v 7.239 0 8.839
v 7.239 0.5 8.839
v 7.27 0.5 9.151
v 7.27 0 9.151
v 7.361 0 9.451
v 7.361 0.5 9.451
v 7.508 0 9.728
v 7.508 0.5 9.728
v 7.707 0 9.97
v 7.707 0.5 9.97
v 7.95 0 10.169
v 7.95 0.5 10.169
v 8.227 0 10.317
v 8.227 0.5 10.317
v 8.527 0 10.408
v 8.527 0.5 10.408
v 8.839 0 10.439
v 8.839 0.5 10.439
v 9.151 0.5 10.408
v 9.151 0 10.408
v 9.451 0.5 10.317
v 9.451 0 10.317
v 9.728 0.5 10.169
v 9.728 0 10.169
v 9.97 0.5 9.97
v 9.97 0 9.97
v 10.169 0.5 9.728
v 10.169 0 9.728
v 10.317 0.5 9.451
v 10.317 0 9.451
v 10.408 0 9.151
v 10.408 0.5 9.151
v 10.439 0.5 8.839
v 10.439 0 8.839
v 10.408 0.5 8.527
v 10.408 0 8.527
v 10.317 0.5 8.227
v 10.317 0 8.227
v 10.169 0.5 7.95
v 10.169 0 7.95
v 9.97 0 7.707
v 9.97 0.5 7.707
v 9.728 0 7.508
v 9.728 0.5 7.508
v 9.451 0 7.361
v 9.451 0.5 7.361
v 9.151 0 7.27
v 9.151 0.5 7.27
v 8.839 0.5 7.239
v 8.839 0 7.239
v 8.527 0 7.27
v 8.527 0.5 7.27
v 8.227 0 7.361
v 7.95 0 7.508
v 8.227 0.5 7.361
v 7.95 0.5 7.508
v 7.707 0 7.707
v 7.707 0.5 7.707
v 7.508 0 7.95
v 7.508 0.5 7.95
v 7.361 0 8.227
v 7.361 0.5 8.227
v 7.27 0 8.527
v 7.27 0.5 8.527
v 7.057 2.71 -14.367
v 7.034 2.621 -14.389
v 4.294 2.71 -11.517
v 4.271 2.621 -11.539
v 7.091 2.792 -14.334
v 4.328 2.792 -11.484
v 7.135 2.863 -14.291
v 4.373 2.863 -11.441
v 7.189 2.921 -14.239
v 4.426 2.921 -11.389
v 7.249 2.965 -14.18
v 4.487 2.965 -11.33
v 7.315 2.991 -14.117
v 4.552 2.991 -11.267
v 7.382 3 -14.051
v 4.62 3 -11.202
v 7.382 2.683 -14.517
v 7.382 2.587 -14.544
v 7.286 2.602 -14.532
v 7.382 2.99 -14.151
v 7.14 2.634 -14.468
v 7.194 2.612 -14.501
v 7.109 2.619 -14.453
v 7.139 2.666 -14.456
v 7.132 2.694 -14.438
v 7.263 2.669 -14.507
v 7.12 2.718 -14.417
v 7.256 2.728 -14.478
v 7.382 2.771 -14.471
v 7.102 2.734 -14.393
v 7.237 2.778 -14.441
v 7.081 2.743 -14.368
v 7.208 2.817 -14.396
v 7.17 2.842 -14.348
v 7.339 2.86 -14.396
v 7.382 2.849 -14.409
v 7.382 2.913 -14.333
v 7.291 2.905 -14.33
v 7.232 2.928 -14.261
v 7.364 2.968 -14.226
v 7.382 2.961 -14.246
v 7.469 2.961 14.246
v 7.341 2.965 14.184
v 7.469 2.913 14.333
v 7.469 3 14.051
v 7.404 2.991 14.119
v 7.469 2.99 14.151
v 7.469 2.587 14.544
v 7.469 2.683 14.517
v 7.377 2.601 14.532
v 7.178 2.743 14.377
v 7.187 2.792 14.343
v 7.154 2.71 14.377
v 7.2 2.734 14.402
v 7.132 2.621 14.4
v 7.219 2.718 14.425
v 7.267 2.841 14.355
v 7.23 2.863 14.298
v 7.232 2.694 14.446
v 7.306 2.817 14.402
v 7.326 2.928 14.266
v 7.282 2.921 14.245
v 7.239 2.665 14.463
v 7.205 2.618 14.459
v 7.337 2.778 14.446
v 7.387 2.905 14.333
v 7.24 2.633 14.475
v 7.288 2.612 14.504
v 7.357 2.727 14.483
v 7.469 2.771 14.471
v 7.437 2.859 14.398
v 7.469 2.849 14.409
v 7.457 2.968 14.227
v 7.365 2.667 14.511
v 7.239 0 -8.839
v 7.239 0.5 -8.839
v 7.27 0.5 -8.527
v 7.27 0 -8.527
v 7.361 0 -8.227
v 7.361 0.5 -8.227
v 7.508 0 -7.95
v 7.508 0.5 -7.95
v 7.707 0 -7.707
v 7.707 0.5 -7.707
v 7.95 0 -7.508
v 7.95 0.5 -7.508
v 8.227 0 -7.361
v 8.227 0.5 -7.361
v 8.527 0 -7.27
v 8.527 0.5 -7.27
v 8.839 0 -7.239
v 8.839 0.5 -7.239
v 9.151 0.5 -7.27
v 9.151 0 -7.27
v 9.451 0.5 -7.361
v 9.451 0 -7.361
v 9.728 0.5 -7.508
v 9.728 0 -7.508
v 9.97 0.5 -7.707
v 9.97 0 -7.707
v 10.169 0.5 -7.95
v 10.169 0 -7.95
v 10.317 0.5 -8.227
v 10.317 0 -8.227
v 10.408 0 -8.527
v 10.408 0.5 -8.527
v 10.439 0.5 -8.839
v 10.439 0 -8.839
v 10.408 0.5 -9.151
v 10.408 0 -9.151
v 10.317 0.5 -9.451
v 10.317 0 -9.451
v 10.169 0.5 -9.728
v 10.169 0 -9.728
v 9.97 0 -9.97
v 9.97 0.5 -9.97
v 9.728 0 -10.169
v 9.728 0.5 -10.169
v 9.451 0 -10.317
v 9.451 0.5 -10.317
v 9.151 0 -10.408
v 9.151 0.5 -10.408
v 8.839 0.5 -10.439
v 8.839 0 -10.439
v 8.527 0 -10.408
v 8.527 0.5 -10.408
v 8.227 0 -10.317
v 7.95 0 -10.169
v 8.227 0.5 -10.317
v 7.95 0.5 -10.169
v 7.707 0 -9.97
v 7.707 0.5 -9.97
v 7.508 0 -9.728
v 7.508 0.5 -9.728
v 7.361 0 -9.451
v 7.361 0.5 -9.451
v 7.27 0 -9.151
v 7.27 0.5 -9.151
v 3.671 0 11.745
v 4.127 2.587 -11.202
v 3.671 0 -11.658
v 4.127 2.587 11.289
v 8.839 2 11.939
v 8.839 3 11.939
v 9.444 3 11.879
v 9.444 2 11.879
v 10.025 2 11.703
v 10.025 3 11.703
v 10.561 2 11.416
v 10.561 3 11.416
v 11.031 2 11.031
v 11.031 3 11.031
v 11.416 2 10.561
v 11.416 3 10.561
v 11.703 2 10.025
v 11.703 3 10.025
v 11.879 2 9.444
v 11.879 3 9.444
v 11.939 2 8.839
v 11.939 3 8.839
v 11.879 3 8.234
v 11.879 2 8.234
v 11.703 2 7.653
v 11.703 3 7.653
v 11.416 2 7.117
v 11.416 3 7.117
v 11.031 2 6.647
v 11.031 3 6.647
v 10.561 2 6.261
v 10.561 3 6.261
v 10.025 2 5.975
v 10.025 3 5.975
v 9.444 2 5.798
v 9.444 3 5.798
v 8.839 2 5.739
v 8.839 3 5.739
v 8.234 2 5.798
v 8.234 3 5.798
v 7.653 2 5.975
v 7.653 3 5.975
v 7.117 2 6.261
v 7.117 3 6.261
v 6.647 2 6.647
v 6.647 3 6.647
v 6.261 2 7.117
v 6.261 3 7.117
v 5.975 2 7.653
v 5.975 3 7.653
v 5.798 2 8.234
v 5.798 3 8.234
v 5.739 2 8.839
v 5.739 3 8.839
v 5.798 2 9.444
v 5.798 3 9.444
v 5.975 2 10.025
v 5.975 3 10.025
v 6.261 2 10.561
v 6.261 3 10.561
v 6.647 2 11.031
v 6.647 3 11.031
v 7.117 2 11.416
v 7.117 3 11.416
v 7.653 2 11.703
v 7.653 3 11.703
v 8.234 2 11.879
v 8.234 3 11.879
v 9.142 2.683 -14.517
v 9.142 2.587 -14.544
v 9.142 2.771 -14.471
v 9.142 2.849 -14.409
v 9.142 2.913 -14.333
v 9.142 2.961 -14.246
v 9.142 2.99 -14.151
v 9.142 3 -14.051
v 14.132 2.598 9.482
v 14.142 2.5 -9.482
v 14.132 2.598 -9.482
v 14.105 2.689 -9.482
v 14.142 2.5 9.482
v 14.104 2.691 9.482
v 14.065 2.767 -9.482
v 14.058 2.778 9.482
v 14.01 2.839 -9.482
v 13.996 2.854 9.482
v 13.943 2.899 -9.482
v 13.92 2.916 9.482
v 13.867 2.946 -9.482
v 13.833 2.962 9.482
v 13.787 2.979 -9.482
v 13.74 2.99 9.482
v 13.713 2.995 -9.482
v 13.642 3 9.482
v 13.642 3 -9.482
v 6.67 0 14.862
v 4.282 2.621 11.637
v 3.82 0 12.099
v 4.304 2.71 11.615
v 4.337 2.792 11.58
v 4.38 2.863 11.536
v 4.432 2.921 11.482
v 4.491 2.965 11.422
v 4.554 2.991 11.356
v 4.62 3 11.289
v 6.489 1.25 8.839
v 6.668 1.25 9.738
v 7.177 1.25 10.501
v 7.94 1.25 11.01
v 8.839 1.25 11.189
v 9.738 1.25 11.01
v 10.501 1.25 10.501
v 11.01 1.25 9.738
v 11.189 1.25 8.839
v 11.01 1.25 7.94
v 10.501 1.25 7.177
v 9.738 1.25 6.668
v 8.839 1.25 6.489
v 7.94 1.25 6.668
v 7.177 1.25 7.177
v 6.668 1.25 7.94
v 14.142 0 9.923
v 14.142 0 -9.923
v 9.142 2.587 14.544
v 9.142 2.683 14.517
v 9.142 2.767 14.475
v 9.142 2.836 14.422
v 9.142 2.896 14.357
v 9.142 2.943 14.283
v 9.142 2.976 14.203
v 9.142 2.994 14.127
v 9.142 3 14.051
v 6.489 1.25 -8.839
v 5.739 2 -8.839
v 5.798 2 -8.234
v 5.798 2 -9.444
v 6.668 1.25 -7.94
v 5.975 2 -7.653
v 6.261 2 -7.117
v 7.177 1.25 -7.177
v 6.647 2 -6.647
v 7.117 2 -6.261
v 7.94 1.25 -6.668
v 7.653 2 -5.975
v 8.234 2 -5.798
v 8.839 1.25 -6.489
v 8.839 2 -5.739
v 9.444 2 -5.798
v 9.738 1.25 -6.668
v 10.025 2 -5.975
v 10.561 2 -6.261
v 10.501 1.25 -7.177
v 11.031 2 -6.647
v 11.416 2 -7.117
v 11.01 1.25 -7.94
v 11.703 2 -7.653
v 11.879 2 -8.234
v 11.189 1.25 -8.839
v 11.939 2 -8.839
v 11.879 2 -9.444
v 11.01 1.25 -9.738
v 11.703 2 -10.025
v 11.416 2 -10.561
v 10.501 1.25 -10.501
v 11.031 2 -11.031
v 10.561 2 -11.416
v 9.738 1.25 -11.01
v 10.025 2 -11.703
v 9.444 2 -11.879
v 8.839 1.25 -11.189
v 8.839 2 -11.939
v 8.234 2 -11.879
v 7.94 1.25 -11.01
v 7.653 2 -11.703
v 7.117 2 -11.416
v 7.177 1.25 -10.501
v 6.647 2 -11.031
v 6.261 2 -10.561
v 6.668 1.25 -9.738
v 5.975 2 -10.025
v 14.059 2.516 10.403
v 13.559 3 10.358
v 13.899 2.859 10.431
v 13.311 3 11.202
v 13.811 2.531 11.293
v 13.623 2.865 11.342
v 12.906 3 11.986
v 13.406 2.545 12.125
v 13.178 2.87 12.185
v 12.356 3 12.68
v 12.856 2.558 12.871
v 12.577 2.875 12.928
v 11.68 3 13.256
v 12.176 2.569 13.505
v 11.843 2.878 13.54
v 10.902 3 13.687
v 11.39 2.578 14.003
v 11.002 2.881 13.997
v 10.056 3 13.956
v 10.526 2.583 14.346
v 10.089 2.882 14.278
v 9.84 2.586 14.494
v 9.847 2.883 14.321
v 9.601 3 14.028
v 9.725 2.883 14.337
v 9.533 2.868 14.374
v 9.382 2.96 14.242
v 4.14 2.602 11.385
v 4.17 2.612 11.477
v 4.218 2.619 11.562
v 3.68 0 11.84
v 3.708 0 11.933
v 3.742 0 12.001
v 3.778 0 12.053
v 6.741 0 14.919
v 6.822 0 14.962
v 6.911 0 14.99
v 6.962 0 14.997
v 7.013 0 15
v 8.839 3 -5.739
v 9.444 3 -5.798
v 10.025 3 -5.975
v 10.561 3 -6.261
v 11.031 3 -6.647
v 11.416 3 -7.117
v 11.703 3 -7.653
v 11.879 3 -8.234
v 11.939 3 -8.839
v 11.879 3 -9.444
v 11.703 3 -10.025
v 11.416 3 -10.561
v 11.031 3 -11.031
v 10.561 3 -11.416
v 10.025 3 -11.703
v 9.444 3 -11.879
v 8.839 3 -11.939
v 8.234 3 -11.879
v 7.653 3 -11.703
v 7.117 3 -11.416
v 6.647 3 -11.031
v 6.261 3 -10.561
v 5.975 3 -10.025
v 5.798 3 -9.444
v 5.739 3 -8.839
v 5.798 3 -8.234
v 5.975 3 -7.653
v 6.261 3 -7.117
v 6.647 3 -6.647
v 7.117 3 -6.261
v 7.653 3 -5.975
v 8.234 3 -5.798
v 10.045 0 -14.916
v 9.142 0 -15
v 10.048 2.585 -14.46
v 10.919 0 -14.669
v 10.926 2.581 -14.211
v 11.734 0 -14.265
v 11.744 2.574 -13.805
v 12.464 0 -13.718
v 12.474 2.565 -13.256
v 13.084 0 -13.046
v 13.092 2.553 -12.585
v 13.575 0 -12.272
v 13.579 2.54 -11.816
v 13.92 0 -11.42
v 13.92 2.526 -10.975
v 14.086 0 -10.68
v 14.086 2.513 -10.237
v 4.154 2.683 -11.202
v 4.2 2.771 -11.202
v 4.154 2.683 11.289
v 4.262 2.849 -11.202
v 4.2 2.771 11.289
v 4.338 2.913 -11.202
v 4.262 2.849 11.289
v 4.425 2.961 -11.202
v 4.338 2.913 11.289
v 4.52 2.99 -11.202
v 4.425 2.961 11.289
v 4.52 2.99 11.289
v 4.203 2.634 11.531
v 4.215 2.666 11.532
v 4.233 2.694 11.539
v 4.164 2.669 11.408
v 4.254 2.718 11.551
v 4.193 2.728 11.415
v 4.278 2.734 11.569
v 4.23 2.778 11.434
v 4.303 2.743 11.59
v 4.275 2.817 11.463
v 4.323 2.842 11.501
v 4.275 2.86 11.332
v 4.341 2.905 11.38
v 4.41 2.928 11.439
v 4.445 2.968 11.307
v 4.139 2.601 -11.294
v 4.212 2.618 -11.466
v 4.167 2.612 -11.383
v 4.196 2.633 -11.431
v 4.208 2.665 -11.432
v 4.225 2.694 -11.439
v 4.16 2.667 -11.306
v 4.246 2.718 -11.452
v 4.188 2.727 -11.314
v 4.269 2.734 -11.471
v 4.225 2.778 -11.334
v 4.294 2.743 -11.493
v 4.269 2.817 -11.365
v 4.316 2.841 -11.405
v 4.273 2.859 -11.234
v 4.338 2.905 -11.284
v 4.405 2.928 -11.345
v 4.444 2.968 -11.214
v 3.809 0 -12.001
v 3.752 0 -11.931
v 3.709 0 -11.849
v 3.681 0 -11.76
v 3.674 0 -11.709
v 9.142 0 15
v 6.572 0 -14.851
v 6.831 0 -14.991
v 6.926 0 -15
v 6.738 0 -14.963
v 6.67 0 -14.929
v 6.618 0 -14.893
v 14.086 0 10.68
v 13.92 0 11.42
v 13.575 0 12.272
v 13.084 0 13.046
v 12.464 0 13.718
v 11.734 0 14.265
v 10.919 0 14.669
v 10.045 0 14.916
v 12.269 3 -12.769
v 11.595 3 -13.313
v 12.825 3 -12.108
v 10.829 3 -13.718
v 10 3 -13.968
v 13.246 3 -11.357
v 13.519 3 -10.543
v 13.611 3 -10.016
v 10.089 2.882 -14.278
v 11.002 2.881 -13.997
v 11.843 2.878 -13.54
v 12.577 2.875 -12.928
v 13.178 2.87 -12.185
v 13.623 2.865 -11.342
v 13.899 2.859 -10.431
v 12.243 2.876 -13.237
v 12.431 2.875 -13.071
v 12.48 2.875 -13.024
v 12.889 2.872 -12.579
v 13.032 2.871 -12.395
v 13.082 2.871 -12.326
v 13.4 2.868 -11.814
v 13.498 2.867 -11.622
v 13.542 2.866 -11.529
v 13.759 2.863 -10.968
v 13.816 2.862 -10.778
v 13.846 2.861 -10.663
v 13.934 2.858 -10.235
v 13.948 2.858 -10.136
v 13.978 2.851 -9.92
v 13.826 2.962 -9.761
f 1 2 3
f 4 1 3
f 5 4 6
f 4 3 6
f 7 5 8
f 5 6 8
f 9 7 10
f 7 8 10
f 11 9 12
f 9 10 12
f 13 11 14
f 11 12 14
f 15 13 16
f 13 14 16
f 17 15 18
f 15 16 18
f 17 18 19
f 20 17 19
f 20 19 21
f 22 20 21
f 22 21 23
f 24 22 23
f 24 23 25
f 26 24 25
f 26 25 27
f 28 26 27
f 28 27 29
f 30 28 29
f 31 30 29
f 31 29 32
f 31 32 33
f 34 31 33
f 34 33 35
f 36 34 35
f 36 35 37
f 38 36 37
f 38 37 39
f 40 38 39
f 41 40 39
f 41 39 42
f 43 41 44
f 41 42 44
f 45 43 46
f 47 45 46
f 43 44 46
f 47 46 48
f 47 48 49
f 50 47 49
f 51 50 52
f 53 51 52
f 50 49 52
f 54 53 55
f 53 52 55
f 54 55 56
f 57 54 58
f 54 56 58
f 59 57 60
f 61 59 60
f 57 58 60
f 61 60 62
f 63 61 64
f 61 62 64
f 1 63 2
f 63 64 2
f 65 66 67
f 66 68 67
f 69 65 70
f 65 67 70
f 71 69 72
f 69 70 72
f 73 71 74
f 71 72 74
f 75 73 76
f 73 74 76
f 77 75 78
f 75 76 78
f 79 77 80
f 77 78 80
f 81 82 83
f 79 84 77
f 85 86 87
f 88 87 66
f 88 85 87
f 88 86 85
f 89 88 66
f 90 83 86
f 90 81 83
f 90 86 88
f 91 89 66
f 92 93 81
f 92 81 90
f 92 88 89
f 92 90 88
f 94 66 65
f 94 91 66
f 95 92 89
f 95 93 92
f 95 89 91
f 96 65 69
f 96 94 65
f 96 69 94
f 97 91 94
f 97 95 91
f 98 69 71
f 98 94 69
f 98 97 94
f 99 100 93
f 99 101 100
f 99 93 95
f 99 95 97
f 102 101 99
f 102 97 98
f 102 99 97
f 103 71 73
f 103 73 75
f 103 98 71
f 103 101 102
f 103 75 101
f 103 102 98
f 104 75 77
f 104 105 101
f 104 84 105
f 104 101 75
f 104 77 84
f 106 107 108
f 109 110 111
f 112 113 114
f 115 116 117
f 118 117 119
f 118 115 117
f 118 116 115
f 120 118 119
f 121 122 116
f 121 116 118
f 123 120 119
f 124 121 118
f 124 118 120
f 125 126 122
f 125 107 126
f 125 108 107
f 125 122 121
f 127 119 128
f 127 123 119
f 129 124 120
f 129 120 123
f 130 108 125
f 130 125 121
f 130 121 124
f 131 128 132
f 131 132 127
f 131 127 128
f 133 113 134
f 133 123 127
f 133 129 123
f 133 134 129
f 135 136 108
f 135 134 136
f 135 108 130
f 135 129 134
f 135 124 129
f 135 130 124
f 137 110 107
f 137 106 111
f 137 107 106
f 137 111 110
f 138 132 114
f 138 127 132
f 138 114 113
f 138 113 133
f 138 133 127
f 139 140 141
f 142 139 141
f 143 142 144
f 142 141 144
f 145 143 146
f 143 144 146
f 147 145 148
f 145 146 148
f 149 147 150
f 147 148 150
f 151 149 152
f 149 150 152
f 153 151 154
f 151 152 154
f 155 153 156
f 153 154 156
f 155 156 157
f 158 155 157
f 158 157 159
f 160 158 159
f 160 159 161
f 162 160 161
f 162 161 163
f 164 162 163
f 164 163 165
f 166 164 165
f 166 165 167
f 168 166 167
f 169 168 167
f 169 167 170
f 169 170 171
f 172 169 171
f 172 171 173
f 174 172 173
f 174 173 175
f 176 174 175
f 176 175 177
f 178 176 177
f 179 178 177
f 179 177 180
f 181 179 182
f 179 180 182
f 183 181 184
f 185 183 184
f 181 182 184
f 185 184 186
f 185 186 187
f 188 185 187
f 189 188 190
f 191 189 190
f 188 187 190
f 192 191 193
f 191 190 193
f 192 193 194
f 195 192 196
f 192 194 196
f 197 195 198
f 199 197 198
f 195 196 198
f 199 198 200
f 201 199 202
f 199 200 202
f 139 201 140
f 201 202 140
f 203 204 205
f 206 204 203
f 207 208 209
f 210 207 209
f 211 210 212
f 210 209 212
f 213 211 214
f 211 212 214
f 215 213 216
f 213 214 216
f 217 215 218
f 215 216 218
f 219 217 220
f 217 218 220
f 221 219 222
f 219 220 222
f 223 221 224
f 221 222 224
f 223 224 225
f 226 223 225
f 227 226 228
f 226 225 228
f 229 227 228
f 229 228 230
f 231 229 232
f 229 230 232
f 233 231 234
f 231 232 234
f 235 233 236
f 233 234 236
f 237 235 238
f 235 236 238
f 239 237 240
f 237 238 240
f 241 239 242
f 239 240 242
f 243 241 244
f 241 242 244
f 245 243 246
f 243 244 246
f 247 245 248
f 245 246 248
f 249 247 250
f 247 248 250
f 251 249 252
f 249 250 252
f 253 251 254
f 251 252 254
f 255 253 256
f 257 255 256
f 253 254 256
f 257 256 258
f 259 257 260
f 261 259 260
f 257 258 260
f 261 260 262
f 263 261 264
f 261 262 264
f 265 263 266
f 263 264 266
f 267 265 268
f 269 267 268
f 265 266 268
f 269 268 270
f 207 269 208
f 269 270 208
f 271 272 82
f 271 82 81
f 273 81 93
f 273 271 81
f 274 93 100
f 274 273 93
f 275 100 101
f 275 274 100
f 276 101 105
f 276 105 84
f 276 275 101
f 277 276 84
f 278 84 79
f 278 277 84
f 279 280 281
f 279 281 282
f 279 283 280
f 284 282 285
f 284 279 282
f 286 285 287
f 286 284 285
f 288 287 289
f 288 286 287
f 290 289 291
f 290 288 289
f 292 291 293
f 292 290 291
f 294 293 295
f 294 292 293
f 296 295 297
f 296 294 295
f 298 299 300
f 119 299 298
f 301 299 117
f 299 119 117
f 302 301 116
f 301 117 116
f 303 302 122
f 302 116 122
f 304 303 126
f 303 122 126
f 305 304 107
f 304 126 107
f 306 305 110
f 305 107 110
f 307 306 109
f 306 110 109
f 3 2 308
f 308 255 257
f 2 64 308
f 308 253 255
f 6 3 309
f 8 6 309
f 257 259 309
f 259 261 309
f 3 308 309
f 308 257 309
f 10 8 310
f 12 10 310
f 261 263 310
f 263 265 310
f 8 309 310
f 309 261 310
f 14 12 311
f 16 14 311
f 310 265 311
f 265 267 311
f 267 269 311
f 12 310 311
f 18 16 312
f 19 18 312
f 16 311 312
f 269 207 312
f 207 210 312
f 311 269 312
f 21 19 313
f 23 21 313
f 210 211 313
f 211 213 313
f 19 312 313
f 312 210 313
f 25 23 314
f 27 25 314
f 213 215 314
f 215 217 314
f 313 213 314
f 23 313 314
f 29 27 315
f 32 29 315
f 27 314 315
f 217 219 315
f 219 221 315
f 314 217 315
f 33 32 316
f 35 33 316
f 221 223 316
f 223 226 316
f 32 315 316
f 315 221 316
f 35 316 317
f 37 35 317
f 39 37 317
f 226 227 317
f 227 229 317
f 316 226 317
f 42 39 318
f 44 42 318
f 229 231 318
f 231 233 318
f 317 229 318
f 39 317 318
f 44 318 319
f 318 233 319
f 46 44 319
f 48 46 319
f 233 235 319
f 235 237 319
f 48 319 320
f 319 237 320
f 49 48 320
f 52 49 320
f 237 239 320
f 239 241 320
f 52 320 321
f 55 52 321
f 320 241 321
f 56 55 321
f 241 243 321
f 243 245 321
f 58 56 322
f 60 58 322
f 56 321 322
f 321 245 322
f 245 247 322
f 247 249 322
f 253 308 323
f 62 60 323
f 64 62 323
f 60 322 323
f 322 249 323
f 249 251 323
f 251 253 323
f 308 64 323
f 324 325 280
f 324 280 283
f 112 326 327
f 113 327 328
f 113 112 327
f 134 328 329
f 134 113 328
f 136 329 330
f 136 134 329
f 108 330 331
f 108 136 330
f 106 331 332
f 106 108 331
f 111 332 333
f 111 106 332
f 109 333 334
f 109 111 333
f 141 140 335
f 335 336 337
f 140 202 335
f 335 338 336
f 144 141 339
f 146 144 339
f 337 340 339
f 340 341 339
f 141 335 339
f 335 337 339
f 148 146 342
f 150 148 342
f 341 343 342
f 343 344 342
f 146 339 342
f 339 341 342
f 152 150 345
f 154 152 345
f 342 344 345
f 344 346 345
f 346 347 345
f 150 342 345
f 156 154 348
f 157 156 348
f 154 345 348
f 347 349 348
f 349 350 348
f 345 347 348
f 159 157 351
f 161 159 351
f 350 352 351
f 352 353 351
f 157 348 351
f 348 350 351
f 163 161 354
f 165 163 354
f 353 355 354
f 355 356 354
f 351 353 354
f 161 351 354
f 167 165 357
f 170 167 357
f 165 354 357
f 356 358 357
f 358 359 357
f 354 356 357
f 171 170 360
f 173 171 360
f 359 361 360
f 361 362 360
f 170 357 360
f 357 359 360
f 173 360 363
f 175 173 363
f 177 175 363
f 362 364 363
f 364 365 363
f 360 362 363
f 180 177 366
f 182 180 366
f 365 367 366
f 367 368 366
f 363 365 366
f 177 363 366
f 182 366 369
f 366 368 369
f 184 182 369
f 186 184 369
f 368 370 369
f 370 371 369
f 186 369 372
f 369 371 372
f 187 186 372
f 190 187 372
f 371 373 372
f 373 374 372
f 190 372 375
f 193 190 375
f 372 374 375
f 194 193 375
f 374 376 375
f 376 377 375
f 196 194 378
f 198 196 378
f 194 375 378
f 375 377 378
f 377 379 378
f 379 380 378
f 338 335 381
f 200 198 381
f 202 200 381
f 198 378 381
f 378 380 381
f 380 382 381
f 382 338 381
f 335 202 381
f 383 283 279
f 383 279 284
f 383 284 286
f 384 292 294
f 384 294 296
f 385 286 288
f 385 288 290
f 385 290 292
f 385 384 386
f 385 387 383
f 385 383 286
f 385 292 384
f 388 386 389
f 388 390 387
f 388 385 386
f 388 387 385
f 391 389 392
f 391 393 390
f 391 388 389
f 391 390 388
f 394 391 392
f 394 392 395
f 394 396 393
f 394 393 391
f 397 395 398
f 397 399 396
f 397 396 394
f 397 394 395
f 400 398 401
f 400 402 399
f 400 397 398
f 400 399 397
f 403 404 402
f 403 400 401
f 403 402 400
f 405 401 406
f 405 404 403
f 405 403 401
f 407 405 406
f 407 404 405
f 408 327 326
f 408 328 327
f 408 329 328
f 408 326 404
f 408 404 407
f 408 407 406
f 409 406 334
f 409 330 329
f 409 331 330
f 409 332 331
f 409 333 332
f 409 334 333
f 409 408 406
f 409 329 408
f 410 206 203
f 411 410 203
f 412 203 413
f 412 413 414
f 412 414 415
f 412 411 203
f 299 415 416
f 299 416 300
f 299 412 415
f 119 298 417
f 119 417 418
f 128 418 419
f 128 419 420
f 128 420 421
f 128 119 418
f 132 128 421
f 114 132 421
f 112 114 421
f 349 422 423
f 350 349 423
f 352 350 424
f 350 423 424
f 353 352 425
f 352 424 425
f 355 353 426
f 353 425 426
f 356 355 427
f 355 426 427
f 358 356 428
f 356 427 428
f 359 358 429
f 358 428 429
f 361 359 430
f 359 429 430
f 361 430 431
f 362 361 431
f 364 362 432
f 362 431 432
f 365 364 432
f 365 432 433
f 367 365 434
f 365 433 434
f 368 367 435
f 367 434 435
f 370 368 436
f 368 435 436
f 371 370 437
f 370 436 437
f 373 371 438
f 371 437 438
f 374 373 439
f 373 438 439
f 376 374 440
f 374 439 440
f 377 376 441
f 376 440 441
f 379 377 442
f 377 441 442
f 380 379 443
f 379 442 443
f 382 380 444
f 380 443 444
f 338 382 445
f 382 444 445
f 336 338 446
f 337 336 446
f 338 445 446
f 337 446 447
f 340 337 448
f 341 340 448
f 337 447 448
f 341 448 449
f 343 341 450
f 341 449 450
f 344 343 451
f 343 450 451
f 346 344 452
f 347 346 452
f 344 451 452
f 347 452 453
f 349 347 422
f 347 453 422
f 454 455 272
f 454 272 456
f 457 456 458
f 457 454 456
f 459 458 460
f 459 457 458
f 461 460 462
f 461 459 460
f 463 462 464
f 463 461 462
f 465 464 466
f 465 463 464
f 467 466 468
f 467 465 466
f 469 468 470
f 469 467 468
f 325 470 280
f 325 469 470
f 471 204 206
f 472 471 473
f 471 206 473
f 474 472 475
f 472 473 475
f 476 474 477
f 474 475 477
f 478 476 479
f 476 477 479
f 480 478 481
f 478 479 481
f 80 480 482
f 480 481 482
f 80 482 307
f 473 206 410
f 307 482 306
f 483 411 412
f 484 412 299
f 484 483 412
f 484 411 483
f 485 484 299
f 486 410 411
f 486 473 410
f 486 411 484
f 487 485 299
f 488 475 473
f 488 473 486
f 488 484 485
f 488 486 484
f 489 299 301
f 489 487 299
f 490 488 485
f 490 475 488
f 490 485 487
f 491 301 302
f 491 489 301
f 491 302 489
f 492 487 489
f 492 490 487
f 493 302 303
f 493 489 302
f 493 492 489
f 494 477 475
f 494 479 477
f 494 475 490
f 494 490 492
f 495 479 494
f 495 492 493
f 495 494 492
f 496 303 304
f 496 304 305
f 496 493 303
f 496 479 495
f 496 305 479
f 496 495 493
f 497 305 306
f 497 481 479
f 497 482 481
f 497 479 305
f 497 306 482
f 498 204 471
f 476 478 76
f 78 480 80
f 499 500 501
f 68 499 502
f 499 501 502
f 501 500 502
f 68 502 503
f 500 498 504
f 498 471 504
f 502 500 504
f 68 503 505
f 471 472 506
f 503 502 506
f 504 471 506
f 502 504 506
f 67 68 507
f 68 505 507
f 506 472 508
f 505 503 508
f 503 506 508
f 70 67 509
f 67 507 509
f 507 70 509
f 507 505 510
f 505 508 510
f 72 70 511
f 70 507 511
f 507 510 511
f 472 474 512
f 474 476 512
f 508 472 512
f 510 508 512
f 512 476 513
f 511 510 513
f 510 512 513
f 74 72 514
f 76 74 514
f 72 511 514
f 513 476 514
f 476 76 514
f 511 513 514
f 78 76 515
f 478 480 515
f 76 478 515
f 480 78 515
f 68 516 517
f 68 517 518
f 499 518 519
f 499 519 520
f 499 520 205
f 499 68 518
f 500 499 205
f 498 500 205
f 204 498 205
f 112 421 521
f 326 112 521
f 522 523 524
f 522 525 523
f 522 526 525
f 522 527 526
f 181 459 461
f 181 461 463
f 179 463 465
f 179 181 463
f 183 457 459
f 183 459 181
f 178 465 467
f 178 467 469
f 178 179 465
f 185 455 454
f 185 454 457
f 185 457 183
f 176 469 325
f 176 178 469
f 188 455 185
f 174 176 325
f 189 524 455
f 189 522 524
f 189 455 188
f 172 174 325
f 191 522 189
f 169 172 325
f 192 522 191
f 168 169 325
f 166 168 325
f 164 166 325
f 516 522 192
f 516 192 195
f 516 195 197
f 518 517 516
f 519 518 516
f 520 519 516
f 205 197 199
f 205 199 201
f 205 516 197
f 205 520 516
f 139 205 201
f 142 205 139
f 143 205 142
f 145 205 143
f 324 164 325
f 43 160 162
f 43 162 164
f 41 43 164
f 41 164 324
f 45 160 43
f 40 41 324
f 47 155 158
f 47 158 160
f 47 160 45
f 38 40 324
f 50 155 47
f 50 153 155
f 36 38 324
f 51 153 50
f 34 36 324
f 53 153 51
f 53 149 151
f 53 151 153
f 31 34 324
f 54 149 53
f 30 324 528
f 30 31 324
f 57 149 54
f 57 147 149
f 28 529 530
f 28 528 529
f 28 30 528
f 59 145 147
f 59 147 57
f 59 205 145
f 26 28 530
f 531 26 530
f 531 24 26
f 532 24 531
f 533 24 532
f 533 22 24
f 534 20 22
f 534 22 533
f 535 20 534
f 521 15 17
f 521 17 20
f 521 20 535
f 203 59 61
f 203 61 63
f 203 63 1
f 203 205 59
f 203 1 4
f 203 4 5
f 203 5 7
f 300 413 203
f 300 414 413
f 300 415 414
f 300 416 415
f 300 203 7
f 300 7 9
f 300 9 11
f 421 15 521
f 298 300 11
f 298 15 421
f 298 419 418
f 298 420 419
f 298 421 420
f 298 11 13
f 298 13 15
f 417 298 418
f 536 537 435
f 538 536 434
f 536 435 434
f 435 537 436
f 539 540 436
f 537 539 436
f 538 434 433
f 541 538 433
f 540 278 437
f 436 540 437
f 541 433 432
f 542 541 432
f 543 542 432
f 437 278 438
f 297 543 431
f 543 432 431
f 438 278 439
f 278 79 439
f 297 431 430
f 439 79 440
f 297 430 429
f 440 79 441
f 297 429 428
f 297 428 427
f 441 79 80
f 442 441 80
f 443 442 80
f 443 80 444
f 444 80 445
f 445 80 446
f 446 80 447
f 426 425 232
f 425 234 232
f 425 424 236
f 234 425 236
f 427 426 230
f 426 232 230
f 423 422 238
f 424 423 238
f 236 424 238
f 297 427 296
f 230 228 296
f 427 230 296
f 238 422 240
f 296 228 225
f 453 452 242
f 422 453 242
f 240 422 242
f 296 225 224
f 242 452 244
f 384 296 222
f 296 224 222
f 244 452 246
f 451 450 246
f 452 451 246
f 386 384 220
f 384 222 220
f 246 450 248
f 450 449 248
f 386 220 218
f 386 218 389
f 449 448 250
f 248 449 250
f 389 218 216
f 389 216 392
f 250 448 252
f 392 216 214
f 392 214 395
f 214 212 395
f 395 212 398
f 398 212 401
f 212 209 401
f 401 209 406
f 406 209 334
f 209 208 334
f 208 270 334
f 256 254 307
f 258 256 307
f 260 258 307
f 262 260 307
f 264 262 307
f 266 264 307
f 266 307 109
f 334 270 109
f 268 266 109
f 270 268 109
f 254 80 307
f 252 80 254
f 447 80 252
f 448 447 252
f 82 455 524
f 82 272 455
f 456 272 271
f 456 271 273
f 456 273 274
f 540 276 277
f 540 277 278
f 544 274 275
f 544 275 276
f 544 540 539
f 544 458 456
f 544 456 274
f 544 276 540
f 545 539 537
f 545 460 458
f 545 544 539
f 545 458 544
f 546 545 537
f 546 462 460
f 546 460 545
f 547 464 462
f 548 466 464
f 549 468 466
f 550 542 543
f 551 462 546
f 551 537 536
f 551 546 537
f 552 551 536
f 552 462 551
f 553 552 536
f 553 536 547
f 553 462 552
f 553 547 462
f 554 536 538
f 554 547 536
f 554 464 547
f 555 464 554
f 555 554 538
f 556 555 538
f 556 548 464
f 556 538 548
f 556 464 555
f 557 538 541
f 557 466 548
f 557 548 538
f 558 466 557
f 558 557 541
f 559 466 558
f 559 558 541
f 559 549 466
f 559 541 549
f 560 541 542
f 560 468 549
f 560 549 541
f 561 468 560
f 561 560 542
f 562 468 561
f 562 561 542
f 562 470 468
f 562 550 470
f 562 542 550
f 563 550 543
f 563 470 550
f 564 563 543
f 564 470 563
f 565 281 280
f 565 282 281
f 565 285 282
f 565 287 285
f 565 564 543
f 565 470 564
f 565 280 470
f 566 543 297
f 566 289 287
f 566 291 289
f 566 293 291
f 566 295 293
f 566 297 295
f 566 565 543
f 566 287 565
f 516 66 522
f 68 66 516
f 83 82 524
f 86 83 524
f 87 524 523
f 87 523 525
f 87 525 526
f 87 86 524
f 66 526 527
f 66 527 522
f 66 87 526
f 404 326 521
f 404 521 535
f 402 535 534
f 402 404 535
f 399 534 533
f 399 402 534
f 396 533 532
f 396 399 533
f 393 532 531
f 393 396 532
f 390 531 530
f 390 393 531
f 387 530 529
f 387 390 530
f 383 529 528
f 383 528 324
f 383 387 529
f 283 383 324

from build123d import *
from OCP.BRepFilletAPI import BRepFilletAPI_MakeChamfer

# Parameters (mm, degrees)
EXTRUDE_1_DEPTH     = 3
EXTRUDE_1_TAPER     = 10.000000000000021
EXTRUDE_3_DEPTH     = 3
CUT_EXTRUDE_3_DEPTH = 17.82260394825962
SKETCH_6_R          = 1.6
CUT_EXTRUDE_2_DEPTH = 21.832600617678803
SKETCH_9_R          = 3.1000000000000005
CUT_EXTRUDE_4_DEPTH = 1
CHAMFER_1_SIZE      = 1.5
FILLET_2_R          = 5
CHAMFER_2_SIZE      = 3
CHAMFER_2_SIZE2     = 3.094724616911856
CHAMFER_2_SIZE2_2   = 3.0947246169118565
FILLET_1_R          = 0.5


with BuildPart() as part:
    # Эскиз1 → Бобышка-Вытянуть1 (new body)
    with BuildSketch(Plane(origin=(0, 0, 0), x_dir=(1, 0, 0), z_dir=(0, 1, 0))):
        Polygon((3.6710190578746005, 14.999999999999998), (3.6710190578746094, -15.000000000000004), (7.67101905787461, -15.000000000000002), (7.6710190578746005, 14.999999999999998), align=None)
    extrude(amount=EXTRUDE_1_DEPTH, taper=EXTRUDE_1_TAPER)


with BuildPart() as body_2:
    # Эскиз2 → Бобышка-Вытянуть3 (new body)
    with BuildSketch(Plane(origin=(0, 0, 0), x_dir=(1, 0, 0), z_dir=(0, 1, 0))):
        Polygon((7.142038115749204, 14.471019057874603), (7.142038115749204, 14.999999999999998), (14.142038115749205, 14.999999999999996), (14.142038115749209, -15.000000000000004), (7.142038115749207, -15.000000000000004), (7.142038115749214, -14.471019057874607), align=None)
    extrude(amount=EXTRUDE_3_DEPTH)

    # Эскиз8 → Вырез-Вытянуть3 (cut, through all)
    with BuildSketch(Plane.ZY.offset(-7.142038115749204)):
        Polygon((-14.999999999999998, 2.999999999999999), (-14.999999999999998, 0), (-14.471019057874603, 3), align=None)
        Polygon((14.471019057874607, 3), (15.000000000000004, 0), (15, 2.999999999999999), align=None)
    extrude(amount=-CUT_EXTRUDE_3_DEPTH, mode=Mode.SUBTRACT)


with BuildPart() as part_1:
    add(part.part)

    # Combine 1: union body 2
    add(body_2.part)

    # Эскиз6 → Вырез-Вытянуть2 (cut, through all)
    with BuildSketch(Plane(origin=(0, 3, 0), x_dir=(1, 1.64e-15, 0), z_dir=(-1.64e-15, 1, 0))):
        with Locations(Location((8.838834764831857, 8.83883476483183, 0), (0, 0, 180))):
            Circle(SKETCH_6_R)
        with Locations(Location((8.838834764831846, -8.83883476483184, 0), (0, 0, 180))):
            Circle(SKETCH_6_R)
    extrude(amount=-CUT_EXTRUDE_2_DEPTH, mode=Mode.SUBTRACT)

    # Эскиз9 → Вырез-Вытянуть4 (cut)
    with BuildSketch(Plane(origin=(0, 3, 0), x_dir=(1, 0, 0), z_dir=(0, 1, 0))):
        with Locations(Location((8.838834764831857, 8.83883476483183, 0), (0, 0, 270))):
            Circle(SKETCH_9_R)
        with Locations(Location((8.838834764831846, -8.83883476483184, 0), (0, 0, 270))):
            Circle(SKETCH_9_R)
    extrude(amount=-CUT_EXTRUDE_4_DEPTH, mode=Mode.SUBTRACT)

    # Фаска1
    chamfer_1_edges = [part_1.edges().sort_by_distance(p)[0] for p in [
        (10.438834764831858, 2.0000000000000027, -8.83883476483183),
        (10.438834764831848, 2.0000000000000027, 8.83883476483184),
    ]]
    chamfer(chamfer_1_edges, length=CHAMFER_1_SIZE - 0.0001)  # a hair under: the kernel refuses the full size

    # Скругление2
    fillet_2_edges = [part_1.edges().sort_by_distance(p)[0] for p in [
        (14.142038115749205, 1.5000000000000049, -14.7355095289373),
        (14.142038115749209, 1.5, 14.735509528937309),
    ]]
    fillet(fillet_2_edges, radius=FILLET_2_R)

    # Фаска2: one chamfer whose edges measure the first distance from different faces: ONE call of the kernel's chamfer builder (chamfer() names one face for all edges)
    chamfer_2_edges_1 = [part_1.edges().sort_by_distance(p)[0] for p in [
        (3.9355095289373074, 1.5, 14.735509528937303),
    ]]
    chamfer_2_side_1 = [part_1.faces().sort_by_distance(p)[0] for p in [
        (3.9339270656333682, 1.4910254046341833, 4.6e-16),
    ]]
    chamfer_2_edges_2 = [part_1.edges().sort_by_distance(p)[0] for p in [
        (3.9355095289372986, 1.5, -14.7355095289373),
    ]]
    chamfer_2_side_2 = [part_1.faces().sort_by_distance(p)[0] for p in [
        (6.536534479688592, 1.4746001134294486, -14.739988214246614),
    ]]
    chamfer_2 = BRepFilletAPI_MakeChamfer(part_1.part.solid().wrapped)
    for e in chamfer_2_edges_1:
        chamfer_2.Add(CHAMFER_2_SIZE, CHAMFER_2_SIZE2, e.wrapped, chamfer_2_side_1[0].wrapped)  # the first distance lies on this face
    for e in chamfer_2_edges_2:
        chamfer_2.Add(CHAMFER_2_SIZE, CHAMFER_2_SIZE2_2, e.wrapped, chamfer_2_side_2[0].wrapped)  # the first distance lies on this face
    add(Compound.cast(chamfer_2.Shape()), mode=Mode.REPLACE)

    # Скругление1
    fillet_1_edges = [part_1.edges().sort_by_distance(p)[0] for p in [
        (14.142038115749207, 3, 1.78e-15),
        (8.193466364554162, 3, -14.471019057874603),
        (12.691076133990677, 3, -12.970196202352879),
        (12.691076133990677, 3, 12.970196202352883),
        (4.200000000000001, 3, 0.0480710792979236),
        (3.935509528937306, 1.4999999999999996, 11.690614915578193),
        (3.9355095289372994, 1.5, -11.594472756982334),
        (6.980404142296417, 1.4999999999999982, -14.735509528937293),
        (8.241537443852085, 3, 14.471019057874605),
        (5.77051838597748, 3, 12.948571751195045),
        (5.722447306679558, 3, -12.900500671897117),
        (7.076546300892258, 1.4999999999999976, 14.735509528937294),
    ]]
    fillet(fillet_1_edges, radius=FILLET_1_R)


solid = part_1.part
